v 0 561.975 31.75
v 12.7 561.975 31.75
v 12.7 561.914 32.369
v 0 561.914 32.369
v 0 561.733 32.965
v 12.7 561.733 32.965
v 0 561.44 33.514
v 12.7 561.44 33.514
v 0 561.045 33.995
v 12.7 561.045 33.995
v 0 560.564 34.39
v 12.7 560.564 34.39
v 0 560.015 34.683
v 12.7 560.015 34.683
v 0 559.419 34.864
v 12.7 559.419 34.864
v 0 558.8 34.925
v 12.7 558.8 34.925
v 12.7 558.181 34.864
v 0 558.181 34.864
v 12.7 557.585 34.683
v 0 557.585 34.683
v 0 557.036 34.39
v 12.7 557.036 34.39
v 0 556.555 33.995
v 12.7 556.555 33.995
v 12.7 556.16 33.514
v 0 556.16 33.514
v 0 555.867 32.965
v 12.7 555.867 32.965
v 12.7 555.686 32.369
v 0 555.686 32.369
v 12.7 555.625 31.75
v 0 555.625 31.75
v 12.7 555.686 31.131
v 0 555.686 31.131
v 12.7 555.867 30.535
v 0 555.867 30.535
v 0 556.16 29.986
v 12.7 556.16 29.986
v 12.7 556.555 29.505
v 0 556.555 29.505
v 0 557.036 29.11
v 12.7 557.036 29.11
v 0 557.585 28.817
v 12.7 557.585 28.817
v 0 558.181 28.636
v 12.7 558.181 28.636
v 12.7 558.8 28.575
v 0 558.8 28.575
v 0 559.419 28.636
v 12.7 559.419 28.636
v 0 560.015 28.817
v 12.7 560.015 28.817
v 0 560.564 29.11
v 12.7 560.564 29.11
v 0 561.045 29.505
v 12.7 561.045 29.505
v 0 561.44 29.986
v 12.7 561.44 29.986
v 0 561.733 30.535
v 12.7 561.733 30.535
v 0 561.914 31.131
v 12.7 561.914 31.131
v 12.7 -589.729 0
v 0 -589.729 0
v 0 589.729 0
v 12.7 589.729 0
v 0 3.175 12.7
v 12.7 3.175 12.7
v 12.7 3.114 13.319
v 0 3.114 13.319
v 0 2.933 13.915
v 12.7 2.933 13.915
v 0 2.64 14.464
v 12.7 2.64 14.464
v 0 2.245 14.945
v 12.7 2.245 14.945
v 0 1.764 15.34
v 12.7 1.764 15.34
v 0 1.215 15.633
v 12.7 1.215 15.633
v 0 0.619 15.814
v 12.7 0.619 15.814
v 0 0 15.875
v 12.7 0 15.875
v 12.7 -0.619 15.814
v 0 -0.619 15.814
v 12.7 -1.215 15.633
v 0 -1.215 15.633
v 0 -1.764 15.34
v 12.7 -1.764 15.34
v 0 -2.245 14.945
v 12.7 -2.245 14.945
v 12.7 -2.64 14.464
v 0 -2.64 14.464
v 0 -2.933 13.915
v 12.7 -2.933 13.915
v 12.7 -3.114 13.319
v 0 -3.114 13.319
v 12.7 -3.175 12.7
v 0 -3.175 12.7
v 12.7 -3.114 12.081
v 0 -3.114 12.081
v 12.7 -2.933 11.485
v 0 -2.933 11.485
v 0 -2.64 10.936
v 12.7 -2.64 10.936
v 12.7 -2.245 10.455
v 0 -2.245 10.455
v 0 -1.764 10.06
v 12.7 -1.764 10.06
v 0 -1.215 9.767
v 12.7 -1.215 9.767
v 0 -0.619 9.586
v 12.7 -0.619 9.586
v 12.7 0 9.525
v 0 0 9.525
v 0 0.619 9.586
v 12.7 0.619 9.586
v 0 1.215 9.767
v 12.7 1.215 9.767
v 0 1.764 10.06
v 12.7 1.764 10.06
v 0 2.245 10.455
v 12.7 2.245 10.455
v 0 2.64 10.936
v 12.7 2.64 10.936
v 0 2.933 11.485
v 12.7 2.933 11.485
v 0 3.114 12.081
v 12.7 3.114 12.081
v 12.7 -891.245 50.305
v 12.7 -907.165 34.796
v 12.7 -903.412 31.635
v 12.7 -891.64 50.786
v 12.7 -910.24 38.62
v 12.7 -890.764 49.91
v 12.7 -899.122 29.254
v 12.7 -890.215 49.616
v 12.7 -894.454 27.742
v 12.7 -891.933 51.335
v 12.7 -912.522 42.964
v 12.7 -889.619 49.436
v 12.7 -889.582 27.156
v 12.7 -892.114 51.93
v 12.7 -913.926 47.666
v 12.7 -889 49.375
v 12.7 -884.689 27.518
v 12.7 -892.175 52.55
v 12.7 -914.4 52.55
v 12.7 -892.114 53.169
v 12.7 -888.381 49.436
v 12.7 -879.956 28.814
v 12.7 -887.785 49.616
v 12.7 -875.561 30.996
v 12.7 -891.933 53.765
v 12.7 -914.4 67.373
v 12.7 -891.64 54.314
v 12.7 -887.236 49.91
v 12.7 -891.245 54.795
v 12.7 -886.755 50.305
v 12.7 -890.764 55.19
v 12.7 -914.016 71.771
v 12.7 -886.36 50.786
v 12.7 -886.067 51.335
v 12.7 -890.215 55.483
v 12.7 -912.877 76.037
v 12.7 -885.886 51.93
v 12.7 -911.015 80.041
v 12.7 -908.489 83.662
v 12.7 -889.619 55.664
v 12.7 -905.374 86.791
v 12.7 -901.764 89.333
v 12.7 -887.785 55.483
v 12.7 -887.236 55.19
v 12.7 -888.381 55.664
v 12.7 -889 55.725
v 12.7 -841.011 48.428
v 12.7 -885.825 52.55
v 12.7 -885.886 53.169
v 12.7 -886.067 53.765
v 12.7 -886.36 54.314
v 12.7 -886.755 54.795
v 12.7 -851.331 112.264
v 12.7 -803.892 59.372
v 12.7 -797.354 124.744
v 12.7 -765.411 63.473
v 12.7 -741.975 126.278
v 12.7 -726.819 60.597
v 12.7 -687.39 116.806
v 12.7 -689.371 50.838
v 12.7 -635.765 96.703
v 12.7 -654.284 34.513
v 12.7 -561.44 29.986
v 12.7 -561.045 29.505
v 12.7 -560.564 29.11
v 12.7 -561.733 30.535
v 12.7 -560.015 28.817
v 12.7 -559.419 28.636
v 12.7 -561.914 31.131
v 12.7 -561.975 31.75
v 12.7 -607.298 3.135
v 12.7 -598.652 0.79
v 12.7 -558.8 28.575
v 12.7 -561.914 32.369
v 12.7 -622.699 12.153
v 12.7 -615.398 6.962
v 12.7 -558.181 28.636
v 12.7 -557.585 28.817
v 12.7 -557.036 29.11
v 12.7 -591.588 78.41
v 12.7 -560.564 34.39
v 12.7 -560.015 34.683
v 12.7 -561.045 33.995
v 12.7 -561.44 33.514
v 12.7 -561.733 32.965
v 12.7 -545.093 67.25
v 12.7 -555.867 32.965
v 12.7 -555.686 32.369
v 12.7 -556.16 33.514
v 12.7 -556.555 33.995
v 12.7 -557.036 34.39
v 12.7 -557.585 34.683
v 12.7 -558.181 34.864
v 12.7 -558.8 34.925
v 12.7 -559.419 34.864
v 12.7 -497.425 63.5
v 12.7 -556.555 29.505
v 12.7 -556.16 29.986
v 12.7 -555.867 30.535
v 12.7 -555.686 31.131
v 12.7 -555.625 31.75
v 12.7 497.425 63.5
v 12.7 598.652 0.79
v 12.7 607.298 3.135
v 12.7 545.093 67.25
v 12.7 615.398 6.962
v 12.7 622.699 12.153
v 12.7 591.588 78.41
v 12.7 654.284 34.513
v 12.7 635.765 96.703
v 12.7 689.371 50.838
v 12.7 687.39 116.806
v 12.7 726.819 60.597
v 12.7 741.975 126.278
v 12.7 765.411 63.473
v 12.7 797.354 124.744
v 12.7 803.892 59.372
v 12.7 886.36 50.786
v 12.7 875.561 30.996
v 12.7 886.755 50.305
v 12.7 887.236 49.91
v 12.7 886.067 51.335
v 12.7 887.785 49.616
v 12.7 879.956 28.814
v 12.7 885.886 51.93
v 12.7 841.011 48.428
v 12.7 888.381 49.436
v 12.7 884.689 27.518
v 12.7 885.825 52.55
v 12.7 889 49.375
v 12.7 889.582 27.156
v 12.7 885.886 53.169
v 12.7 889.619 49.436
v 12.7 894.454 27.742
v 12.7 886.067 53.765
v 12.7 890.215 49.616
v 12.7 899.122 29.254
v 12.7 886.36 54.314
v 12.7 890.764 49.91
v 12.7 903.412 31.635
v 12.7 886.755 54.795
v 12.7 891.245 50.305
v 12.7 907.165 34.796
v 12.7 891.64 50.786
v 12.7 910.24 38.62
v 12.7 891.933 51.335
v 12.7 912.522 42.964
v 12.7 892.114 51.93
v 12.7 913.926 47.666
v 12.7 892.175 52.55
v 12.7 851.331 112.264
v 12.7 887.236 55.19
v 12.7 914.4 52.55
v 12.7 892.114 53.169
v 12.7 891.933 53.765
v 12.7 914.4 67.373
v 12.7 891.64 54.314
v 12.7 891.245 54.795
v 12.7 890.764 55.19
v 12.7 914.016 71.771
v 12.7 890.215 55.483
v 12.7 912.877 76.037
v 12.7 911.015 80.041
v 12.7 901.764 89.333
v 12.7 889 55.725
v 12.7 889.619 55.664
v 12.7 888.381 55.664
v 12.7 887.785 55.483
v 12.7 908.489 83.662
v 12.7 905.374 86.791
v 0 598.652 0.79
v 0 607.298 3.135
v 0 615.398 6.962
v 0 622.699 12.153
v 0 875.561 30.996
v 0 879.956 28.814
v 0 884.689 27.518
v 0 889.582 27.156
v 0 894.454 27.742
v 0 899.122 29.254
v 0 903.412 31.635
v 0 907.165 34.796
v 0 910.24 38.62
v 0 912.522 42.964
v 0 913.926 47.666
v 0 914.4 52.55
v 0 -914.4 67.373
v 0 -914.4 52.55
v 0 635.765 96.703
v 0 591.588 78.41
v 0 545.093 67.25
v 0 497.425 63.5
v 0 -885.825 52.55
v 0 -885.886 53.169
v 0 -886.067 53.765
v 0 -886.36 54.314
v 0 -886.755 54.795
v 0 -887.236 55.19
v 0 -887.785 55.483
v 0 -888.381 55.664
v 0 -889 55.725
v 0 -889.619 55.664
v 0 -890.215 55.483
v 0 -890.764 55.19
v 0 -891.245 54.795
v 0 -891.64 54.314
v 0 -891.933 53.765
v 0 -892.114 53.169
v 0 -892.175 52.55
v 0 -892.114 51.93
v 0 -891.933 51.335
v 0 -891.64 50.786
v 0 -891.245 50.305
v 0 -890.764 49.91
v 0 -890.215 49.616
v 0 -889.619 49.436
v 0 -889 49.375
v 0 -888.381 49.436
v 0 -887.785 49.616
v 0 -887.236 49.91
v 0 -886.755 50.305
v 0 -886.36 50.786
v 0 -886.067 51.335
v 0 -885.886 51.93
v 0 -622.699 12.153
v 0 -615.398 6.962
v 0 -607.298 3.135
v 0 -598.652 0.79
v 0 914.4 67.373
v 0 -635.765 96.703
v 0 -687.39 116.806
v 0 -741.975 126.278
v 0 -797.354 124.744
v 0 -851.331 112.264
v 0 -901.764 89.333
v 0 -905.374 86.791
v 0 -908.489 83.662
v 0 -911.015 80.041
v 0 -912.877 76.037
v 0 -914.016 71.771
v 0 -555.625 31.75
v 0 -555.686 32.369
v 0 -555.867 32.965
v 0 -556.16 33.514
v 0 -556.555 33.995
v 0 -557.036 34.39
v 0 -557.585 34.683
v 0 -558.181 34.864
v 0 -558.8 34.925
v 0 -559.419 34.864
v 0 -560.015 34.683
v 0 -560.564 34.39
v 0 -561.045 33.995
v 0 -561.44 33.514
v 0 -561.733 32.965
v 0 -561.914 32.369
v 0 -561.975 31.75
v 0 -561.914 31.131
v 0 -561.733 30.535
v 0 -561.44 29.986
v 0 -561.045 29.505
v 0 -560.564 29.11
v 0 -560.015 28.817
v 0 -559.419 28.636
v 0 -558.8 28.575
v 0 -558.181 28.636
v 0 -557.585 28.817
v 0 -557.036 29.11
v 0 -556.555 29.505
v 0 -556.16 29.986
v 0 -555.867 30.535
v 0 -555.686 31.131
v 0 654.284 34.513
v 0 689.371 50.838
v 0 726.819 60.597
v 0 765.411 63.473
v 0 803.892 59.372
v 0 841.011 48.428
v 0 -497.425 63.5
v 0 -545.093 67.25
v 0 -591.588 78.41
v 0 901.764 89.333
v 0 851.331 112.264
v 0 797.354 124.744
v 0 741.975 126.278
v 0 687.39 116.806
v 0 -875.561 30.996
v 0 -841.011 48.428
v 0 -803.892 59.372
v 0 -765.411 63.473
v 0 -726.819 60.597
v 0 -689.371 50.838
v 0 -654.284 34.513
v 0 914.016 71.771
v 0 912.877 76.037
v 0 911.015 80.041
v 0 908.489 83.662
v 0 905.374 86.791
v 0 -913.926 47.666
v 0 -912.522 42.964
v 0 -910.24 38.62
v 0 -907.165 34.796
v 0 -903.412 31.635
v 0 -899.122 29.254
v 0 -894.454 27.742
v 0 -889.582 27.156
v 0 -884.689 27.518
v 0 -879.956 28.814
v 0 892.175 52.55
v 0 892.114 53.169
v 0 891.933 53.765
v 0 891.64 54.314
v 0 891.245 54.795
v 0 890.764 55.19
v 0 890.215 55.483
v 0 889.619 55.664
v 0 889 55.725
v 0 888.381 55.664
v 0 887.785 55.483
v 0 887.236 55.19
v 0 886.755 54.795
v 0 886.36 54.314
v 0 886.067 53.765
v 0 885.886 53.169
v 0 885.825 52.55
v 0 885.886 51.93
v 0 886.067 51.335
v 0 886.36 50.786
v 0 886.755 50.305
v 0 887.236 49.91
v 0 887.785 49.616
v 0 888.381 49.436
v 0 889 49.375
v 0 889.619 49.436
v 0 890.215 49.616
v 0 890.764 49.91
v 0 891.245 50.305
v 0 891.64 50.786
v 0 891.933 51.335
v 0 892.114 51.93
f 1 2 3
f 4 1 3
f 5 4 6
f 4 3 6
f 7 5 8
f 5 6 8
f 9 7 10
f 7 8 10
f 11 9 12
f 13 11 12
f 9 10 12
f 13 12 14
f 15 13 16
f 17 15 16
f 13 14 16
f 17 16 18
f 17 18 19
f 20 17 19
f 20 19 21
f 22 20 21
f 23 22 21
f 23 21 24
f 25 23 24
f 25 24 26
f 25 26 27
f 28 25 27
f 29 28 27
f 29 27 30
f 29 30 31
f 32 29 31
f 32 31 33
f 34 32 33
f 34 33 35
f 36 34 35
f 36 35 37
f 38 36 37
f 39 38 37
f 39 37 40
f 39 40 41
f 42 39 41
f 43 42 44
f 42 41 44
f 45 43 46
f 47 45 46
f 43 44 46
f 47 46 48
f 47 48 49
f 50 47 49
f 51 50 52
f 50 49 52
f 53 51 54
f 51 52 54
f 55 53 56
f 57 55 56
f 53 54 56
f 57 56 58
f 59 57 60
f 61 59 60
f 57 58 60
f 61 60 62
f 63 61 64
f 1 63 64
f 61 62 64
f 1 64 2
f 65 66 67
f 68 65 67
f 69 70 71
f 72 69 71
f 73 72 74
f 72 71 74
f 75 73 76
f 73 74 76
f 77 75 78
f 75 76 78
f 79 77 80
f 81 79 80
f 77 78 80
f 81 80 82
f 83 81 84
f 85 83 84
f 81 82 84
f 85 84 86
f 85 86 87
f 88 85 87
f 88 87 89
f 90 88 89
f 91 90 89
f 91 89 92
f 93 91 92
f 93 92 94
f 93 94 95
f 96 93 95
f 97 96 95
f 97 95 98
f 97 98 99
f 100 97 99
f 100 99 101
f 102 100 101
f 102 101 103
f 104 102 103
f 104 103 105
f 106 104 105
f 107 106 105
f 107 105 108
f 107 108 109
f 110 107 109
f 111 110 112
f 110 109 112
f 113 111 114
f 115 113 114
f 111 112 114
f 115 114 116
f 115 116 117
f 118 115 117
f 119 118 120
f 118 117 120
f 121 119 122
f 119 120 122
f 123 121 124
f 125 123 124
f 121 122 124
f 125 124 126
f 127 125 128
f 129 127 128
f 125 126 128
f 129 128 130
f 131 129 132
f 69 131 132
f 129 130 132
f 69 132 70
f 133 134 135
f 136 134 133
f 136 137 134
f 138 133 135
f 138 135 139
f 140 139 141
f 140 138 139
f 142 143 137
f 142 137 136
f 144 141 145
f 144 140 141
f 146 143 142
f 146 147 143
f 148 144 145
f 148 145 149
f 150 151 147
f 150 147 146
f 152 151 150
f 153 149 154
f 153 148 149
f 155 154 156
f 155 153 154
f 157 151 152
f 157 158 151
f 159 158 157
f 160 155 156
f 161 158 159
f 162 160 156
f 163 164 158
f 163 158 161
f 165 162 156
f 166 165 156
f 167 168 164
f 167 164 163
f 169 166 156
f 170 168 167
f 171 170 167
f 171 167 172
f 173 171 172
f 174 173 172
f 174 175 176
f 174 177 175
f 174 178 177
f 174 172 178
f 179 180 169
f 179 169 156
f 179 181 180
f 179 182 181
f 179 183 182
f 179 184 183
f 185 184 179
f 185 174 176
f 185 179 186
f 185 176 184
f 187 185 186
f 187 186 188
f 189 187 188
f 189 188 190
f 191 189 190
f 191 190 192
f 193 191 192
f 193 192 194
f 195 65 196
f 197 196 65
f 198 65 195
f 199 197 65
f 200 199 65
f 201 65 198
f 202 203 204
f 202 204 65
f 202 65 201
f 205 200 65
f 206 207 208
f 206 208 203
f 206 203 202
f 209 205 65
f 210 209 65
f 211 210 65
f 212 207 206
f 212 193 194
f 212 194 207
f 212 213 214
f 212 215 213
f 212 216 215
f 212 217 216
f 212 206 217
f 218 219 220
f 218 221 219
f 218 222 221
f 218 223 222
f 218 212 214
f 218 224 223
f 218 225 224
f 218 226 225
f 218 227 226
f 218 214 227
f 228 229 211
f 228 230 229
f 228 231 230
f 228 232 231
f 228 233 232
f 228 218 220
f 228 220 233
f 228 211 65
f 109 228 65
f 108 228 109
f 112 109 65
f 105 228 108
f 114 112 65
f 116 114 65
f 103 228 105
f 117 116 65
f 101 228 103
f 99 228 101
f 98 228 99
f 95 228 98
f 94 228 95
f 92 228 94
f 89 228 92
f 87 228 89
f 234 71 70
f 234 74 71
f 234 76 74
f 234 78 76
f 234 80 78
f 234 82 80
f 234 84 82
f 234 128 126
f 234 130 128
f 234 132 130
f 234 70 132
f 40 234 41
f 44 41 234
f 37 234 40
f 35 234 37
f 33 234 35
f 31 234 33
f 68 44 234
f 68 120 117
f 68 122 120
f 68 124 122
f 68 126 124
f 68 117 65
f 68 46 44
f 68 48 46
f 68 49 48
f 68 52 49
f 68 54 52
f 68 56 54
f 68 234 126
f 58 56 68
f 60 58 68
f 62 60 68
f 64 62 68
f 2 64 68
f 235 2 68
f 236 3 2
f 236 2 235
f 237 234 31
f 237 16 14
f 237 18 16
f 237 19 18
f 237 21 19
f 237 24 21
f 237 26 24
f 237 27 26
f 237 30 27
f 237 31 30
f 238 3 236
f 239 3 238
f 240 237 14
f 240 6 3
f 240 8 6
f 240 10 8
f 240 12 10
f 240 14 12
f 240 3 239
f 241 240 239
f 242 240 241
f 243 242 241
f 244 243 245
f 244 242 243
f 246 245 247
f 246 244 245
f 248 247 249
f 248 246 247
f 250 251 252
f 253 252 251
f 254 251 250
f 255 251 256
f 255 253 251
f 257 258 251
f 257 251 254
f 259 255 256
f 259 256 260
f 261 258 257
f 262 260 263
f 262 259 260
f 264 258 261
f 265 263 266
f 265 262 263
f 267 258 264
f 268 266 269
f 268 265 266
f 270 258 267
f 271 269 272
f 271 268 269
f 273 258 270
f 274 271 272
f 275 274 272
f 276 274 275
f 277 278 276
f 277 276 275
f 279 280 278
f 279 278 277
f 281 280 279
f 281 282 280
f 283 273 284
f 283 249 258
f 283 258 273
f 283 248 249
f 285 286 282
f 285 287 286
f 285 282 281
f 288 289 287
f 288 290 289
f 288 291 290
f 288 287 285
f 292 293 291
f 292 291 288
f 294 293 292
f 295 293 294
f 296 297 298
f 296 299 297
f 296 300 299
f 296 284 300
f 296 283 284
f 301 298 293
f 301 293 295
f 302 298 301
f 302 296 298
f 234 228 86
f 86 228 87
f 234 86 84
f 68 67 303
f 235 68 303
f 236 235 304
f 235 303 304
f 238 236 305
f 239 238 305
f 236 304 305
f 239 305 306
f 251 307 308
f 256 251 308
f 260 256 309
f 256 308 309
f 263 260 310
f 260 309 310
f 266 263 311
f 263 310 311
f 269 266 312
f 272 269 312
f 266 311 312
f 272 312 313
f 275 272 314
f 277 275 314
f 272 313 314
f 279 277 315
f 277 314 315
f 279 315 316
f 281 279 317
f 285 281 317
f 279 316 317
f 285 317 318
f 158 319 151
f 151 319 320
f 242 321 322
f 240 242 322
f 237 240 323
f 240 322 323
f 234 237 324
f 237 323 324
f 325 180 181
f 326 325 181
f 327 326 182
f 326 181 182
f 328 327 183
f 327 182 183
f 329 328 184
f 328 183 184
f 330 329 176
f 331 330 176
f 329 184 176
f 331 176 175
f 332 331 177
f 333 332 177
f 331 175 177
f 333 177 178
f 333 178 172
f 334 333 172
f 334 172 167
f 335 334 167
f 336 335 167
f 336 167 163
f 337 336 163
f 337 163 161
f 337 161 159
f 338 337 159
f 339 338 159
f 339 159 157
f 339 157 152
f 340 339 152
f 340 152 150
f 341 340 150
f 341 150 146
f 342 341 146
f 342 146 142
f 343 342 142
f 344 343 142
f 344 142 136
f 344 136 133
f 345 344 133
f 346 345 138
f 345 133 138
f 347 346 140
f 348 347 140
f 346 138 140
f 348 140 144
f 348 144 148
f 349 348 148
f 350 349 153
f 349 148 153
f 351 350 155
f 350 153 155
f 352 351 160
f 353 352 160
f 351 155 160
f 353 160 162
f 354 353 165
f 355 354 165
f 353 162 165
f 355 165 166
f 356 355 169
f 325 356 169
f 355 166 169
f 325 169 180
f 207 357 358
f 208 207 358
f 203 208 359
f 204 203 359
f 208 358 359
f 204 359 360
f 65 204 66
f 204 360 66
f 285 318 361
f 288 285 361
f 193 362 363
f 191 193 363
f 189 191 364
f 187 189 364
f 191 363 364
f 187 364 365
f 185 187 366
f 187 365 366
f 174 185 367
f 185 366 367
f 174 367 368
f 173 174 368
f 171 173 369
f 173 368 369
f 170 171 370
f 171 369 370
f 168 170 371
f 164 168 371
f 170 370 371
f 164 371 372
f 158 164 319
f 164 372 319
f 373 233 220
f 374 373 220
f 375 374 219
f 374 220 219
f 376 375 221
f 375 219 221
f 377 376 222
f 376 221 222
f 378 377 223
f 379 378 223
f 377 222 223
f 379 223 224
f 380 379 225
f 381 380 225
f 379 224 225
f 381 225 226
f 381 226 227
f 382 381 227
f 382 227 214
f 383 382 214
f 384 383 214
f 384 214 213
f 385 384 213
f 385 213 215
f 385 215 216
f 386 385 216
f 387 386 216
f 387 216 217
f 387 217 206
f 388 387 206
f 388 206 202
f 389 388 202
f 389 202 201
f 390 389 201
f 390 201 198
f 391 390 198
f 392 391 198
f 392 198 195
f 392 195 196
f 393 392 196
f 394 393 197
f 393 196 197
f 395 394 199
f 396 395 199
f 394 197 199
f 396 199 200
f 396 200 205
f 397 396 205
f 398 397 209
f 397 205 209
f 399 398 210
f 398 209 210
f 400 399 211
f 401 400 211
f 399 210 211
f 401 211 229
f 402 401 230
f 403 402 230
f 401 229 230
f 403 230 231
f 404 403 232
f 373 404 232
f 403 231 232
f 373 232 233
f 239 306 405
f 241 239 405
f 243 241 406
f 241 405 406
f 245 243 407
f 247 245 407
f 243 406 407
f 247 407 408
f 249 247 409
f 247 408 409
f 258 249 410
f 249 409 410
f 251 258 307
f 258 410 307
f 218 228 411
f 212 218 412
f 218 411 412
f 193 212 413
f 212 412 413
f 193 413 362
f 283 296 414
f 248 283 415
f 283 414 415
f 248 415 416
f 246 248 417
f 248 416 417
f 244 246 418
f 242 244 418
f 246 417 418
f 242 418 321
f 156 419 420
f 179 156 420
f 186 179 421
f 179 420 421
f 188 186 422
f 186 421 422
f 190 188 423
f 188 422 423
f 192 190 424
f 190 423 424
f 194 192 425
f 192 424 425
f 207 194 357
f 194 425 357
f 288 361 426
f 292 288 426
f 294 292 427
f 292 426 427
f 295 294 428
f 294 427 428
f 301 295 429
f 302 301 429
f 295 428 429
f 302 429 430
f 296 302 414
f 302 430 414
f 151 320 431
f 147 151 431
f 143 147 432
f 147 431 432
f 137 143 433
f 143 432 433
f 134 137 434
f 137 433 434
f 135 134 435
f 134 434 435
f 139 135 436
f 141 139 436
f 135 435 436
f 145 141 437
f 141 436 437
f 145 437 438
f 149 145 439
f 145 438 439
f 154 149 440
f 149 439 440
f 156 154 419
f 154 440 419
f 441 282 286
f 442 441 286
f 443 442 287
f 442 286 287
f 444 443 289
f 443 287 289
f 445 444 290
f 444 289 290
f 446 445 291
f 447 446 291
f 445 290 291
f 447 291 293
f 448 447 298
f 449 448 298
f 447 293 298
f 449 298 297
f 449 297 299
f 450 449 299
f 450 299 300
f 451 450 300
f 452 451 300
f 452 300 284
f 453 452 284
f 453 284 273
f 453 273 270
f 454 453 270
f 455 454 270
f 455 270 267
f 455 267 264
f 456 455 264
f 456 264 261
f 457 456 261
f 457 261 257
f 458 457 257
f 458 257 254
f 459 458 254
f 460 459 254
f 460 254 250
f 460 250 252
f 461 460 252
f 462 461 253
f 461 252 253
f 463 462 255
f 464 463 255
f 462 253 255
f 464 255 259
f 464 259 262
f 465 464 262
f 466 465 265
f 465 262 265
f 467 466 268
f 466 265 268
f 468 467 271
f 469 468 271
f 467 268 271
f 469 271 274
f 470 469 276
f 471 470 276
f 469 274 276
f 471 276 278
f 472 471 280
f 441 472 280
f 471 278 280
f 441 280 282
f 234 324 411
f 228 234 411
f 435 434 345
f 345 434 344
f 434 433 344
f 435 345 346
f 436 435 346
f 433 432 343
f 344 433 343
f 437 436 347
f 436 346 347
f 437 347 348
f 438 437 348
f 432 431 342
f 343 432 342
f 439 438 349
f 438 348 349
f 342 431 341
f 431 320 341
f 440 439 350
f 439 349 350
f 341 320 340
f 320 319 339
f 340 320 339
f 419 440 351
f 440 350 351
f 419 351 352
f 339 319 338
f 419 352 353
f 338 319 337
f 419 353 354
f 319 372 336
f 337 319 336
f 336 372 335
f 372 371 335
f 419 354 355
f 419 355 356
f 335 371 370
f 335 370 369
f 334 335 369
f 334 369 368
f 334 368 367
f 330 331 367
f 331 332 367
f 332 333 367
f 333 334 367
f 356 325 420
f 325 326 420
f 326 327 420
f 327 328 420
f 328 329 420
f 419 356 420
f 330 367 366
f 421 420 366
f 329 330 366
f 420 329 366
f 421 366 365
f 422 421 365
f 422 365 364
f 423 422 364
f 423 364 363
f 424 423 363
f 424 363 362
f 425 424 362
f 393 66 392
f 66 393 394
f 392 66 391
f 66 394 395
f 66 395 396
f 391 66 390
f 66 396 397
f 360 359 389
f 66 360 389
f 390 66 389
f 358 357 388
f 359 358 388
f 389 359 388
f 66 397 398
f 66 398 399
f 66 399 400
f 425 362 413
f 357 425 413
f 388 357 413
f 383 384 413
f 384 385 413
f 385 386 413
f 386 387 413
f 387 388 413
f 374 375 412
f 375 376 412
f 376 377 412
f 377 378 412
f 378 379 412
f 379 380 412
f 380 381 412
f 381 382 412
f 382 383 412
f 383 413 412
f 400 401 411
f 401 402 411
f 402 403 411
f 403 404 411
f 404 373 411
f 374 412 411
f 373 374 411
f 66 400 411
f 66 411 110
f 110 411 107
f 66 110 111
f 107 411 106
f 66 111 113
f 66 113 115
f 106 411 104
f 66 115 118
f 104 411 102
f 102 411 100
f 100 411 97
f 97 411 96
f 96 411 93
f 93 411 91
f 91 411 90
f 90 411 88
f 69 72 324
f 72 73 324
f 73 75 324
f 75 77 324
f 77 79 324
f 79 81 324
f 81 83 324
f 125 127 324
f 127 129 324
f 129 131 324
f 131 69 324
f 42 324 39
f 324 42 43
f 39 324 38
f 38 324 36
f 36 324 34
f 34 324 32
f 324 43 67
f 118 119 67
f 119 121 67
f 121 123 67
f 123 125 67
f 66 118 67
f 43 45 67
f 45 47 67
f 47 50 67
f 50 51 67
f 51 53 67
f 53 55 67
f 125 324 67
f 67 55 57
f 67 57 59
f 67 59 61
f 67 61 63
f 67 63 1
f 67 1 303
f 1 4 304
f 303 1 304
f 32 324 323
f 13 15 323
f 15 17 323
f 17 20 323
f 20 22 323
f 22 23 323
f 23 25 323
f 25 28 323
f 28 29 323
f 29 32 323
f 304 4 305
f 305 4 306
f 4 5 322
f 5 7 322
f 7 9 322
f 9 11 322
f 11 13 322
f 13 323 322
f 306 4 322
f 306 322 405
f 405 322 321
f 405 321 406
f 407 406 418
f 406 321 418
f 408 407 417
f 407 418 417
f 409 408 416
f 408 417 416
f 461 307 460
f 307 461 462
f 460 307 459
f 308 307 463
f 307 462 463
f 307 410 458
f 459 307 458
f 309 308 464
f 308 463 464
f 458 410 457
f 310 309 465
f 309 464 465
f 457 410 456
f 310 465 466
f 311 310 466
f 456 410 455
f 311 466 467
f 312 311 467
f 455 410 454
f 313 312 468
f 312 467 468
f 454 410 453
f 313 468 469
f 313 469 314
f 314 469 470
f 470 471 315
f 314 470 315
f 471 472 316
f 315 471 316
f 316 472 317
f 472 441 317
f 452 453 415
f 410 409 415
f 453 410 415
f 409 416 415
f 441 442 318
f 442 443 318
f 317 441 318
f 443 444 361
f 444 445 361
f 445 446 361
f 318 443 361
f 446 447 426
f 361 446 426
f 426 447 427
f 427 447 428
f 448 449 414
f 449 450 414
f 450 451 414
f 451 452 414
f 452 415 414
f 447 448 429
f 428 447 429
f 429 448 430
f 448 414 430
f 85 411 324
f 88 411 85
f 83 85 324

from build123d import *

# Parameters (mm, degrees)
F1_DEPTH      = 12.7
F2_R          = 3.175
F3_DEPTH      = 25.4
F3_DEPTH_BACK = 1882


# Not quite as in the source:
# - an extrude ends at something that could not be found from the text; its depth is read off the source's solid


with BuildPart() as f1:
    # F0 (on Right) → F1 (new body)
    with BuildSketch(Plane.YZ):
        with BuildLine():
            ThreePointArc((-622.6993794949, 12.1531100478), (-607.2983658108, 3.1350127999), (-589.7288184286, 0))
            Line((-589.7288184286, 0), (589.7288184286, 0))
            ThreePointArc((589.7288184286, 0), (607.2983658108, 3.1350127999), (622.6993794949, 12.1531100478))
            ThreePointArc((622.6993794949, 12.1531100478), (746.0500791914, 62.9065317561), (875.5608465608, 30.9962502452))
            ThreePointArc((875.5608465608, 30.9962502452), (901.3248834202, 30.3402571366), (914.4, 52.5496526411))
            Line((914.4, 52.5496526411), (914.4, 67.3727526142))
            ThreePointArc((914.4, 67.3727526142), (911.0154605337, 80.0408028781), (901.7638190955, 89.3328282539))
            ThreePointArc((901.7638190955, 89.3328282539), (769.7029358002, 126.8933113968), (635.7649329622, 96.7026143791))
            ThreePointArc((635.7649329622, 96.7026143791), (568.5593617374, 71.9168669296), (497.4251334688, 63.5))
            Line((497.4251334688, 63.5), (-497.4251334688, 63.5))
            ThreePointArc((-497.4251334688, 63.5), (-568.5593617374, 71.9168669296), (-635.7649329622, 96.7026143791))
            ThreePointArc((-635.7649329622, 96.7026143791), (-769.7029358002, 126.8933113968), (-901.7638190955, 89.3328282539))
            ThreePointArc((-901.7638190955, 89.3328282539), (-911.0154605337, 80.0408028781), (-914.4, 67.3727526142))
            Line((-914.4, 67.3727526142), (-914.4, 52.5496526411))
            ThreePointArc((-914.4, 52.5496526411), (-901.3248834202, 30.3402571366), (-875.5608465608, 30.9962502452))
            ThreePointArc((-875.5608465608, 30.9962502452), (-746.0500791914, 62.9065317561), (-622.6993794949, 12.1531100478))
        make_face()
    extrude(amount=F1_DEPTH)

    # F2 (on face) → F3 (cut, two sides)
    with BuildSketch(Plane.YZ.offset(12.7)) as f3_sk:
        with Locations((-889, 52.5496526411)):
            Circle(F2_R)
        with Locations((-558.8, 31.75)):
            Circle(F2_R)
        with Locations((0, 12.7)):
            Circle(F2_R)
        with Locations((558.8, 31.75)):
            Circle(F2_R)
        with Locations((889, 52.5496526411)):
            Circle(F2_R)
    extrude(amount=-F3_DEPTH, mode=Mode.SUBTRACT)
    extrude(f3_sk.sketch, amount=F3_DEPTH_BACK, mode=Mode.SUBTRACT)


solid = f1.part
